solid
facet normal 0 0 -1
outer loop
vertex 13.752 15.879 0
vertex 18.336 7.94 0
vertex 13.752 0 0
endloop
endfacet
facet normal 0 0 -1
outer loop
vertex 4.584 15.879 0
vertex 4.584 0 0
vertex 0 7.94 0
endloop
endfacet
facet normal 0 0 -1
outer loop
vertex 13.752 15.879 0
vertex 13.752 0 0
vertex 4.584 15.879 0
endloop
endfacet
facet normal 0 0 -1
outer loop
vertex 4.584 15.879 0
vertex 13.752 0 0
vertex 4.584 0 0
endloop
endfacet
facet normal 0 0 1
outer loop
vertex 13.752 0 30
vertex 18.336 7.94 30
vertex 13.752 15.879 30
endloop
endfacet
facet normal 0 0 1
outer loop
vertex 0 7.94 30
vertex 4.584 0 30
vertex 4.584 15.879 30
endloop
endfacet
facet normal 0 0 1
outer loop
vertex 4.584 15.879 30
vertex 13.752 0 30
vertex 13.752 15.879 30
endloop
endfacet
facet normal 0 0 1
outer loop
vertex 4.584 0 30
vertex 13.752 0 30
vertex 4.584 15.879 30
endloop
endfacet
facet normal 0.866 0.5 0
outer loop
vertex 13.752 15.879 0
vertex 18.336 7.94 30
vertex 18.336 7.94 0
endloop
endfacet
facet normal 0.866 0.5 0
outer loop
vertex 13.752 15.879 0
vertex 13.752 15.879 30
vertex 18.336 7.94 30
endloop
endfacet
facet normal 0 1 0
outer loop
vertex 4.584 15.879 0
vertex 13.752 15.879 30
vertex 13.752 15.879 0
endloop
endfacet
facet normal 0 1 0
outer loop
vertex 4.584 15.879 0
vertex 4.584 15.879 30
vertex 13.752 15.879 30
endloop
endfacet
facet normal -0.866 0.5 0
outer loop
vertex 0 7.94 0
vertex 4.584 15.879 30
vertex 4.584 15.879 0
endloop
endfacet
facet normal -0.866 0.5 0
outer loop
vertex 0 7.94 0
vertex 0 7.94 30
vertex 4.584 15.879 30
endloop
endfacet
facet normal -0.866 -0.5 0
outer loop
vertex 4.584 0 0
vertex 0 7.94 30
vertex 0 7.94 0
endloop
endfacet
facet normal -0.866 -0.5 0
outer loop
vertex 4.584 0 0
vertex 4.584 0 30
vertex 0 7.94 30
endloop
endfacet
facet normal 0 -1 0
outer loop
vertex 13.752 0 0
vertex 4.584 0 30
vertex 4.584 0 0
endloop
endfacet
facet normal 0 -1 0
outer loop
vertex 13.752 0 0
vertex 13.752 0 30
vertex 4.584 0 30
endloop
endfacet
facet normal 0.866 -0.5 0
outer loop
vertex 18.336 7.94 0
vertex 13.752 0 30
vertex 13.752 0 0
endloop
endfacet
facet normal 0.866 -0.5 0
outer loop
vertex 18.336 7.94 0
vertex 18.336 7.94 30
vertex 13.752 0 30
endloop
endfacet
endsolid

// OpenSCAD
$fn = 32;

// ----------------------------------------------------------------------
// Key bar: hex key, 30 mm thick
// ----------------------------------------------------------------------

// --- parameters (mm) ---
profile_height = 30;      // extrusion height
profile_points = 6;       // points of the closed outline

profile = [[18.336, 7.94], [13.752, 15.879], [4.584, 15.879], [0, 7.94], [4.584, 0], [13.752, 0]];  // single closed polygon, 6 points, counter clockwise

// --- the one profile operation ---
linear_extrude(height = profile_height) polygon(points = profile);
